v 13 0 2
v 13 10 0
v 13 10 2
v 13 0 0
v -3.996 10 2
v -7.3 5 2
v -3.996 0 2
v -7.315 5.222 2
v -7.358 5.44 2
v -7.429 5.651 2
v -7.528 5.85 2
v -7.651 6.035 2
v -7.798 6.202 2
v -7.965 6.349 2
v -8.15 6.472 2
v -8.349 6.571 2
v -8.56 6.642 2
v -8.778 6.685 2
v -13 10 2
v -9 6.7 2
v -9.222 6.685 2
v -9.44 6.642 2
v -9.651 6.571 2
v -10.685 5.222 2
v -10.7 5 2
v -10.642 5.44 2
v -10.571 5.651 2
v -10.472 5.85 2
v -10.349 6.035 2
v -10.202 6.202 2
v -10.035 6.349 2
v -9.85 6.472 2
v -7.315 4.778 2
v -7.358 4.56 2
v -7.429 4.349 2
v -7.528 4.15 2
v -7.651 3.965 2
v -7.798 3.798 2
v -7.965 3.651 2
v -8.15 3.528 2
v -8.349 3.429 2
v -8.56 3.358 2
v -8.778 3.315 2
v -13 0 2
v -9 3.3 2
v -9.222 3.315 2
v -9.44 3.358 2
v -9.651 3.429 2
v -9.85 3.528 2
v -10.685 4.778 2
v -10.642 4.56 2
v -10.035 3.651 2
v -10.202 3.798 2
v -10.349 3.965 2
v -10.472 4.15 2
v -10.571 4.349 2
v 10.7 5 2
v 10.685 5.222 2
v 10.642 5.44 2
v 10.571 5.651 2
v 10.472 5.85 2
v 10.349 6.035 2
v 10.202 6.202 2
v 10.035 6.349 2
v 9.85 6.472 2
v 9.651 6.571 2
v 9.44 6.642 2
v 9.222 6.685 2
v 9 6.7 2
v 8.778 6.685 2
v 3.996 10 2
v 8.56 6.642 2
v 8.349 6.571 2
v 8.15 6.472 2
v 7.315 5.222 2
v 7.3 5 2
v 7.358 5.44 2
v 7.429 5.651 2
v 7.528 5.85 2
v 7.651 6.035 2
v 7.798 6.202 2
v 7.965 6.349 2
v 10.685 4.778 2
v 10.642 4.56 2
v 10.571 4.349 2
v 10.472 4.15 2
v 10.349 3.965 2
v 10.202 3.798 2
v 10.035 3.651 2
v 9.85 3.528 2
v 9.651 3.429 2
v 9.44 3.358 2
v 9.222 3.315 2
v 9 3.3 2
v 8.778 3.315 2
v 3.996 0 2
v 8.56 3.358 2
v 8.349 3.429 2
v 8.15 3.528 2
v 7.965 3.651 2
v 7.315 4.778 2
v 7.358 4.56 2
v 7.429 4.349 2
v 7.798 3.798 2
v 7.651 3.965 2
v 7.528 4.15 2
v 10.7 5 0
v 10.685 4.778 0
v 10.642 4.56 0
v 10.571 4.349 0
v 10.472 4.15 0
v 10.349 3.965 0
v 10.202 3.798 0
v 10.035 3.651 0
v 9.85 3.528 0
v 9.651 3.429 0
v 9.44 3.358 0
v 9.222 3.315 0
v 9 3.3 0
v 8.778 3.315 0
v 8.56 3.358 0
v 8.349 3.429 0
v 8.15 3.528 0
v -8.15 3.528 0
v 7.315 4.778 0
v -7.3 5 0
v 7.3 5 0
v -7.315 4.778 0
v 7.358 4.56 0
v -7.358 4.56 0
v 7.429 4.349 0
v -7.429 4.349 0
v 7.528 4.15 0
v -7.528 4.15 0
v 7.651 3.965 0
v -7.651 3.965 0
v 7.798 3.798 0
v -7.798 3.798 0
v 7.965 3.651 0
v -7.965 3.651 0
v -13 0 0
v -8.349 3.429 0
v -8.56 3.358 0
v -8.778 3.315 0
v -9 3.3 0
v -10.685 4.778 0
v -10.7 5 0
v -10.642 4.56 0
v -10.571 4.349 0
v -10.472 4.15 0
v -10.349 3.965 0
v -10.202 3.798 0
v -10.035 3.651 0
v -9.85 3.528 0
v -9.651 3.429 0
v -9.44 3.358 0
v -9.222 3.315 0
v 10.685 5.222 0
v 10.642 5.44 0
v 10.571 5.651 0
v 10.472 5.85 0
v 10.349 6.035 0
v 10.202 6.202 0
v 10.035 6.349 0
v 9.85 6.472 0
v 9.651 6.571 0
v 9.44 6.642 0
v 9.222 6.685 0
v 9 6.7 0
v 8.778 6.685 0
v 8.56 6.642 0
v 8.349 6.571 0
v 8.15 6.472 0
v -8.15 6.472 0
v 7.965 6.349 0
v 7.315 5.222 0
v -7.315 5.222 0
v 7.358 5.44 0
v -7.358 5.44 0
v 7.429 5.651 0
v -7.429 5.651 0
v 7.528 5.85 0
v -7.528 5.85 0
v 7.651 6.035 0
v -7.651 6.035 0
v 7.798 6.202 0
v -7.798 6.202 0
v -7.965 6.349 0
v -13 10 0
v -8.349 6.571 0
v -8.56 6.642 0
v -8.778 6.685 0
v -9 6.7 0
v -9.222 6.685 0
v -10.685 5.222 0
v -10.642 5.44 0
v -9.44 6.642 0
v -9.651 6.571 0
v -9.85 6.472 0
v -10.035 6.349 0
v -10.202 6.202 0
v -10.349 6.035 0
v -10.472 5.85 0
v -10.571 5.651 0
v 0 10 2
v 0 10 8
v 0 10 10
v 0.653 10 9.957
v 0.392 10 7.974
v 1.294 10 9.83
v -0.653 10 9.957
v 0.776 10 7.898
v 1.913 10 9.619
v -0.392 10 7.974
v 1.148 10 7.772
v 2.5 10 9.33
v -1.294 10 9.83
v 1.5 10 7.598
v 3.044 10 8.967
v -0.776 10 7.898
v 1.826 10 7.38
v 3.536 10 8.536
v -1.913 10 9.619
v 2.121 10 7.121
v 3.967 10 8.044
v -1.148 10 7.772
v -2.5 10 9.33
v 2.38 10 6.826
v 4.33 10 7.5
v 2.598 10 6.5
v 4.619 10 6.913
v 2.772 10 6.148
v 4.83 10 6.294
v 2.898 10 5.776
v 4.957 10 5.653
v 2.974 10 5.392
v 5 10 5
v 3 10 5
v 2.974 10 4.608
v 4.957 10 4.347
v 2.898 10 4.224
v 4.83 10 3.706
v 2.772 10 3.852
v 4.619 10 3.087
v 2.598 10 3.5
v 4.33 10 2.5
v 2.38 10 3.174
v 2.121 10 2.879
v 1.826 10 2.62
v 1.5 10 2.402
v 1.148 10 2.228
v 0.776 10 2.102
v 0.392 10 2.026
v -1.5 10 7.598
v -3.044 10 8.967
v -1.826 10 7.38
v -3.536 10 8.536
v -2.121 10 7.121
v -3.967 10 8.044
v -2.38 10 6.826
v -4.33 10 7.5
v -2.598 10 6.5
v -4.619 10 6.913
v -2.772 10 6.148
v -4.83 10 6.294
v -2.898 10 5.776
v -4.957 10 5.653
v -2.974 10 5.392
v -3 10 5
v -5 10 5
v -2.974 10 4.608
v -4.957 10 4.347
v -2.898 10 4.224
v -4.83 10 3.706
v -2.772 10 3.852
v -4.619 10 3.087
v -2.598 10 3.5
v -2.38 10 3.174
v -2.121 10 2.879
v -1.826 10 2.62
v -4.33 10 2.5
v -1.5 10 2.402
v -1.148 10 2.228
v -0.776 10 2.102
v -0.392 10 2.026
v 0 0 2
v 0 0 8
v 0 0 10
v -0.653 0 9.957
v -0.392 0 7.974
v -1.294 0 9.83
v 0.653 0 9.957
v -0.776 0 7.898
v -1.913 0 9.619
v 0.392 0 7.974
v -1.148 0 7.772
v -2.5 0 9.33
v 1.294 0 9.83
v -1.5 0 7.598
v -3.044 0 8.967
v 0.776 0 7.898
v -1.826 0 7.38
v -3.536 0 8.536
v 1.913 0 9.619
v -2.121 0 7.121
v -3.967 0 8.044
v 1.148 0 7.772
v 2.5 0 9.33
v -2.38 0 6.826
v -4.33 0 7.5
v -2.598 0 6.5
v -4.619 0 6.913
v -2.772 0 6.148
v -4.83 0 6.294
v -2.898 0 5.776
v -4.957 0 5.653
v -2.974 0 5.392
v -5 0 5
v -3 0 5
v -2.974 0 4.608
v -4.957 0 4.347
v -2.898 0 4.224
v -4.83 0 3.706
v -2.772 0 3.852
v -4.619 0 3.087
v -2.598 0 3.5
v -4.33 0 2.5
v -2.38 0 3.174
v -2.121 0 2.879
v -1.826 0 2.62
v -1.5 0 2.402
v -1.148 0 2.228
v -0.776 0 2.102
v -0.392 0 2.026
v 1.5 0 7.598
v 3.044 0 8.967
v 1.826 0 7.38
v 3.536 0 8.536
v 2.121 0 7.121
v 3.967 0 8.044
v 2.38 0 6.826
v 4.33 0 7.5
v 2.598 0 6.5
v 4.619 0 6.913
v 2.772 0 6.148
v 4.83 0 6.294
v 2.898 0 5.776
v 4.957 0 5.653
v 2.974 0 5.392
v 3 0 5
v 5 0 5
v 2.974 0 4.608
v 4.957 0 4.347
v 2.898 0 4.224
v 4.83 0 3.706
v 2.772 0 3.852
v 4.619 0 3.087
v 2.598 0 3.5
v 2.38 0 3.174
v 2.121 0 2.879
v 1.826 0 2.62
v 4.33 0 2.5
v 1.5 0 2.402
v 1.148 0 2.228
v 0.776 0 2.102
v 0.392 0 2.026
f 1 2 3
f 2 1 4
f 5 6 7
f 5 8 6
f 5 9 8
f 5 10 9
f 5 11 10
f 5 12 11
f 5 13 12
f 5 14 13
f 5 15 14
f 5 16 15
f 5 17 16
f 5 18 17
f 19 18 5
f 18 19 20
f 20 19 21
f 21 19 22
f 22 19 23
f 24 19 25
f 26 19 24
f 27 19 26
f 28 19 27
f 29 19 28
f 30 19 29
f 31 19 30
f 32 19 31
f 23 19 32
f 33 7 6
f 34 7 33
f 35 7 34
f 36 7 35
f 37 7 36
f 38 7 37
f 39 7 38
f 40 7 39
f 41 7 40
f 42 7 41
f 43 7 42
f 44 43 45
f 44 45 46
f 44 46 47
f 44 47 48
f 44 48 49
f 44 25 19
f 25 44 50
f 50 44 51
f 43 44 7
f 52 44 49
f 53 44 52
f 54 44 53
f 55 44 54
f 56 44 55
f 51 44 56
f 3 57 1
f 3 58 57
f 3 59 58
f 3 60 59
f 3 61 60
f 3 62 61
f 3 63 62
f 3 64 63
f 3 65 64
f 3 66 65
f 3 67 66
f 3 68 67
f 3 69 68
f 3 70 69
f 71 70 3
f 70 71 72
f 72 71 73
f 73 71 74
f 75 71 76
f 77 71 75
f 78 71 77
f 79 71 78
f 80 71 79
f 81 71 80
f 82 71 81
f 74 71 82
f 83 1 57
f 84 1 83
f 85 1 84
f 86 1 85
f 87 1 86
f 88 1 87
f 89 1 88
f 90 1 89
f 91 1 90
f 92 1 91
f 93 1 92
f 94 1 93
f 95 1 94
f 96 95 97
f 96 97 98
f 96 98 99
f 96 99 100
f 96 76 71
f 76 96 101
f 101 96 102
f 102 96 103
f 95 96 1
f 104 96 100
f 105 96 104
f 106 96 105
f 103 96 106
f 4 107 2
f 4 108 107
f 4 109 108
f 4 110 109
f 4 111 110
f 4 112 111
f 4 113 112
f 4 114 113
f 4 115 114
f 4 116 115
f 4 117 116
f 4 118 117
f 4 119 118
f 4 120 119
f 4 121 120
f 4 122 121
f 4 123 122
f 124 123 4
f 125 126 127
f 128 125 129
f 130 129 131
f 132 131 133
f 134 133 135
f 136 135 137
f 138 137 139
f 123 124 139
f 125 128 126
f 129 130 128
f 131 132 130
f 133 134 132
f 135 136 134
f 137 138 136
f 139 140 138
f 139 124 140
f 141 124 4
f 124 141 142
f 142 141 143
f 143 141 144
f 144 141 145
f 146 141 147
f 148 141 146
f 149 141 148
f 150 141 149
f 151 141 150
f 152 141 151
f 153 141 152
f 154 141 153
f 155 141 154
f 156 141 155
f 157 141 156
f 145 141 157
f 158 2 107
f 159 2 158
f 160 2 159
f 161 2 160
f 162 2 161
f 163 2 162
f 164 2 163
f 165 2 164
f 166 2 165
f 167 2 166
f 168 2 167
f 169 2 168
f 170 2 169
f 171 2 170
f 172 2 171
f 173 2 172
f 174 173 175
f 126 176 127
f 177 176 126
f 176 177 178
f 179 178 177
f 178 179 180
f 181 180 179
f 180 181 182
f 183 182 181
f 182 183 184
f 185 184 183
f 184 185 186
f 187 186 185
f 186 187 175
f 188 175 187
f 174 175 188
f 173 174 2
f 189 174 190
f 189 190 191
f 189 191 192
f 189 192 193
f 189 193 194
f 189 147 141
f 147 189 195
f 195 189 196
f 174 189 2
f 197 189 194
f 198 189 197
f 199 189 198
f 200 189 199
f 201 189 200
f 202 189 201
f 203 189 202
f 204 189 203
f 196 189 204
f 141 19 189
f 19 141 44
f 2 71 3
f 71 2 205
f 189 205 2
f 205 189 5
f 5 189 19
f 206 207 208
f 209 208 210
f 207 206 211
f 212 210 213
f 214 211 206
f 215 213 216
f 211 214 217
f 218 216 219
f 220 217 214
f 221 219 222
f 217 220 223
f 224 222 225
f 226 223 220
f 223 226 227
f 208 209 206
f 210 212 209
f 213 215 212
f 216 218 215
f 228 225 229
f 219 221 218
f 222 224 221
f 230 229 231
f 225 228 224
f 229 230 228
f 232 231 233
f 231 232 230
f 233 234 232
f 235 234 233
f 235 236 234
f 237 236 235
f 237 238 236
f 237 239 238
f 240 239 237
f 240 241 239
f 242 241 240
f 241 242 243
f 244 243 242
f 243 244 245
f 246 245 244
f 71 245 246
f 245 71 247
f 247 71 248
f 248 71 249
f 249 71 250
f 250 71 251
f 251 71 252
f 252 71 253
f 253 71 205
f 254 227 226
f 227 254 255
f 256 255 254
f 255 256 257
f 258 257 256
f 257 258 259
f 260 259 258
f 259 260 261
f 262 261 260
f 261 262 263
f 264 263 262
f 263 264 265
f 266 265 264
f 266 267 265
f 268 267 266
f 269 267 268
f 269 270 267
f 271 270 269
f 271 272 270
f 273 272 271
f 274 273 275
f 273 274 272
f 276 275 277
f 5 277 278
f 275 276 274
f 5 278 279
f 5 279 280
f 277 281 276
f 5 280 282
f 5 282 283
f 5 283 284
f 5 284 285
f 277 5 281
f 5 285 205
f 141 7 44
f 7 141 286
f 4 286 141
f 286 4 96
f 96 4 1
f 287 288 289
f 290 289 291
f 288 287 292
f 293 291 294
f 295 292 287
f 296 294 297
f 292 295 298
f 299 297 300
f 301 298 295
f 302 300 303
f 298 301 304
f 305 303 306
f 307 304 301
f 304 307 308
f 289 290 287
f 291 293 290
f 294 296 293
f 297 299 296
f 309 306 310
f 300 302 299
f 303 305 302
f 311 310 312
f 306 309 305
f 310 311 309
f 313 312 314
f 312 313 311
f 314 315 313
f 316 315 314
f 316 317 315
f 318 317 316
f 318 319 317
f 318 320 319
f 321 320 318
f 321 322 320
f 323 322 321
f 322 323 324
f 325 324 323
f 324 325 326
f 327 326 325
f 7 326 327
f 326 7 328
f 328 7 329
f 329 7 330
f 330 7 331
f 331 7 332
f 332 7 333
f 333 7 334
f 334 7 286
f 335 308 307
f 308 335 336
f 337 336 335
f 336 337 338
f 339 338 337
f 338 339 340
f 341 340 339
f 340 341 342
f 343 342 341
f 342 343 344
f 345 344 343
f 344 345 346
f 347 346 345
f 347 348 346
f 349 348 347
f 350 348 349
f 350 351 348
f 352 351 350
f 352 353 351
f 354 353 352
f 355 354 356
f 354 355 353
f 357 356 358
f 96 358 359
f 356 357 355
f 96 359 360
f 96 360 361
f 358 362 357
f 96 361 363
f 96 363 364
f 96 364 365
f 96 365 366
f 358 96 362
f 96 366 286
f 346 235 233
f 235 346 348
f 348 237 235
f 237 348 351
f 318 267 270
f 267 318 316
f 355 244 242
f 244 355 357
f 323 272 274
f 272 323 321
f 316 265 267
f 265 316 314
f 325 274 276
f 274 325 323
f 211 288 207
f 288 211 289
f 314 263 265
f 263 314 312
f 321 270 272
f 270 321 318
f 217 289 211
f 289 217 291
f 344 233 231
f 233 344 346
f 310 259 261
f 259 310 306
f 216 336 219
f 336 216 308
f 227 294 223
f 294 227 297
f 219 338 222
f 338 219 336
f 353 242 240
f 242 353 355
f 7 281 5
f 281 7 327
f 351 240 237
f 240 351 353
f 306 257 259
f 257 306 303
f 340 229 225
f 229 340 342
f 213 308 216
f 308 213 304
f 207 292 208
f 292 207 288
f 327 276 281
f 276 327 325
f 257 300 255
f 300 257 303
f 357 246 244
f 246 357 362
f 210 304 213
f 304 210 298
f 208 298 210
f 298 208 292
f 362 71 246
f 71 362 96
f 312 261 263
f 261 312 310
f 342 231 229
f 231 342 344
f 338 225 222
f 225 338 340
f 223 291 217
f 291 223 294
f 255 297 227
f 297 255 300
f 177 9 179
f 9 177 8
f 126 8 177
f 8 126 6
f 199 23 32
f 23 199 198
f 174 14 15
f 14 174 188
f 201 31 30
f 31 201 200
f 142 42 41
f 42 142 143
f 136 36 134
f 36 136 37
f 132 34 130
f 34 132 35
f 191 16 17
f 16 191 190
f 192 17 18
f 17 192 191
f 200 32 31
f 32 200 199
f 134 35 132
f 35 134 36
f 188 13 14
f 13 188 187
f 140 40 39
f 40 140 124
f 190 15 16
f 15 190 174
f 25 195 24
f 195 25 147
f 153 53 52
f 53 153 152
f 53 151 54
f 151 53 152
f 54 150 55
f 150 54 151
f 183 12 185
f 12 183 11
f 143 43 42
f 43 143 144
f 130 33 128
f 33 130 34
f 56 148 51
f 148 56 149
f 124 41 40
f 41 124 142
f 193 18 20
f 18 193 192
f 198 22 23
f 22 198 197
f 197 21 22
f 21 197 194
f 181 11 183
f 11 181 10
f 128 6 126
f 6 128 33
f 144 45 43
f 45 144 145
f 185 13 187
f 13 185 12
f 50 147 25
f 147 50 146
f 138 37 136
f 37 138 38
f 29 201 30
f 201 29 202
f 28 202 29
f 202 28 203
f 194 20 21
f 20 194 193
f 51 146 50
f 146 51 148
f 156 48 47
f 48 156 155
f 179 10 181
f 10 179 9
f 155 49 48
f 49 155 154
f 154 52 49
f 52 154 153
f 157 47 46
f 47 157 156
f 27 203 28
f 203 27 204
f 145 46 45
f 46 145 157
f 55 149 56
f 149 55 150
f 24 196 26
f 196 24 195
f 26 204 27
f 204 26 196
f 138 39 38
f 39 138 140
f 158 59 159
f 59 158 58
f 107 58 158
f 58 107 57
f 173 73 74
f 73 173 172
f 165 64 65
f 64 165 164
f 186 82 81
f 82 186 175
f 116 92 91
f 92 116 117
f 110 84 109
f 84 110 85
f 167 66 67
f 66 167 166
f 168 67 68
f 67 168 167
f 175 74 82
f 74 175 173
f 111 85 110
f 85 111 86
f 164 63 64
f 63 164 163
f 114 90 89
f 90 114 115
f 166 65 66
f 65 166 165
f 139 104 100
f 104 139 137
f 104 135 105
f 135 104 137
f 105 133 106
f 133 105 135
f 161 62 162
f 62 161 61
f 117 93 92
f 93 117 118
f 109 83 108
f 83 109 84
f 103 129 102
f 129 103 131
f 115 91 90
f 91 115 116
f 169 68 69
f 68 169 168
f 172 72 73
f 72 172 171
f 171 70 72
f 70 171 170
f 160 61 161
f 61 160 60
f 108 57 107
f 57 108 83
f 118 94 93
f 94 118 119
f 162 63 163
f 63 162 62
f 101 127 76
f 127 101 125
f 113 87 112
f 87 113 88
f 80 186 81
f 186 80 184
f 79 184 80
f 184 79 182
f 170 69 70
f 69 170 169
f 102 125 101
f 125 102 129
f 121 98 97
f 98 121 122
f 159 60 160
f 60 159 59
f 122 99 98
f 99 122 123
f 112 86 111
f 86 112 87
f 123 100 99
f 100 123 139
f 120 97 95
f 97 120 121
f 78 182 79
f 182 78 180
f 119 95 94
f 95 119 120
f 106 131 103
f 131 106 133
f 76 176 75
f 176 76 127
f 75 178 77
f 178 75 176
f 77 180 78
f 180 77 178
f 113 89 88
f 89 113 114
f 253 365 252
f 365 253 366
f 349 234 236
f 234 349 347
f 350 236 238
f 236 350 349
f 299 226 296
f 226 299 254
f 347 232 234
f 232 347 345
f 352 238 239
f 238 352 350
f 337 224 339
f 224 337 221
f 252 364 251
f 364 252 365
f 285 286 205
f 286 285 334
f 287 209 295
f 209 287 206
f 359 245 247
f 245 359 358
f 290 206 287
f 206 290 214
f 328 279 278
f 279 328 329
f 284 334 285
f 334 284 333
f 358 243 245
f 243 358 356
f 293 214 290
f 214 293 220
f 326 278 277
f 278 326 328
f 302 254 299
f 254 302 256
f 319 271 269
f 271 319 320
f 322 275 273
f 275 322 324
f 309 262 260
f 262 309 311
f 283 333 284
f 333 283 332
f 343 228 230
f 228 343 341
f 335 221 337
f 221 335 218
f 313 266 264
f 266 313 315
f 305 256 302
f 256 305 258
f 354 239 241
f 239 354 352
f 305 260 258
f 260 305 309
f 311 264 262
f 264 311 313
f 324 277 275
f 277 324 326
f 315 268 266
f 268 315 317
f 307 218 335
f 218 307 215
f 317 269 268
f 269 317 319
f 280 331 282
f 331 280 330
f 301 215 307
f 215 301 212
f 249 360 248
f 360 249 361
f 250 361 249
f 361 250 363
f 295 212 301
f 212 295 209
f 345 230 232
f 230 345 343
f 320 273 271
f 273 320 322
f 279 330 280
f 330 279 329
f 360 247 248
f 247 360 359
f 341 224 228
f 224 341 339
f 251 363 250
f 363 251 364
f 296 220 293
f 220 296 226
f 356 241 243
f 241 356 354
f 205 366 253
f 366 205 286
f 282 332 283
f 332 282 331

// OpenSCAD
// Screw-down cable clip. CC0. cable = cable diameter (mm); screw hole for M3/#4 wood screw.
cable = 6; width = 10; t = 2;
$fn = 48;
difference() {
  union() {
    translate([-(cable / 2 + t + 8), 0, 0]) cube([cable + 2 * t + 16, width, t]);
    translate([0, width, cable / 2 + t]) rotate([90, 0, 0]) cylinder(r = cable / 2 + t, h = width);
  }
  translate([0, width + 1, cable / 2 + t]) rotate([90, 0, 0]) cylinder(r = cable / 2, h = width + 2);
  translate([-(cable / 2 + t + 8), -1, -10]) cube([cable + 2 * t + 16, width + 2, 10]);
  translate([-(cable / 2 + t + 8), -1, t + 0.01]) cube([8, width + 2, cable + 2 * t]);  // flat feet stay flat
  translate([cable / 2 + t, -1, t + 0.01]) cube([8, width + 2, cable + 2 * t]);
  for (x = [-(cable / 2 + t + 4), cable / 2 + t + 4]) translate([x, width / 2, -1]) cylinder(d = 3.4, h = t + 2);
}
